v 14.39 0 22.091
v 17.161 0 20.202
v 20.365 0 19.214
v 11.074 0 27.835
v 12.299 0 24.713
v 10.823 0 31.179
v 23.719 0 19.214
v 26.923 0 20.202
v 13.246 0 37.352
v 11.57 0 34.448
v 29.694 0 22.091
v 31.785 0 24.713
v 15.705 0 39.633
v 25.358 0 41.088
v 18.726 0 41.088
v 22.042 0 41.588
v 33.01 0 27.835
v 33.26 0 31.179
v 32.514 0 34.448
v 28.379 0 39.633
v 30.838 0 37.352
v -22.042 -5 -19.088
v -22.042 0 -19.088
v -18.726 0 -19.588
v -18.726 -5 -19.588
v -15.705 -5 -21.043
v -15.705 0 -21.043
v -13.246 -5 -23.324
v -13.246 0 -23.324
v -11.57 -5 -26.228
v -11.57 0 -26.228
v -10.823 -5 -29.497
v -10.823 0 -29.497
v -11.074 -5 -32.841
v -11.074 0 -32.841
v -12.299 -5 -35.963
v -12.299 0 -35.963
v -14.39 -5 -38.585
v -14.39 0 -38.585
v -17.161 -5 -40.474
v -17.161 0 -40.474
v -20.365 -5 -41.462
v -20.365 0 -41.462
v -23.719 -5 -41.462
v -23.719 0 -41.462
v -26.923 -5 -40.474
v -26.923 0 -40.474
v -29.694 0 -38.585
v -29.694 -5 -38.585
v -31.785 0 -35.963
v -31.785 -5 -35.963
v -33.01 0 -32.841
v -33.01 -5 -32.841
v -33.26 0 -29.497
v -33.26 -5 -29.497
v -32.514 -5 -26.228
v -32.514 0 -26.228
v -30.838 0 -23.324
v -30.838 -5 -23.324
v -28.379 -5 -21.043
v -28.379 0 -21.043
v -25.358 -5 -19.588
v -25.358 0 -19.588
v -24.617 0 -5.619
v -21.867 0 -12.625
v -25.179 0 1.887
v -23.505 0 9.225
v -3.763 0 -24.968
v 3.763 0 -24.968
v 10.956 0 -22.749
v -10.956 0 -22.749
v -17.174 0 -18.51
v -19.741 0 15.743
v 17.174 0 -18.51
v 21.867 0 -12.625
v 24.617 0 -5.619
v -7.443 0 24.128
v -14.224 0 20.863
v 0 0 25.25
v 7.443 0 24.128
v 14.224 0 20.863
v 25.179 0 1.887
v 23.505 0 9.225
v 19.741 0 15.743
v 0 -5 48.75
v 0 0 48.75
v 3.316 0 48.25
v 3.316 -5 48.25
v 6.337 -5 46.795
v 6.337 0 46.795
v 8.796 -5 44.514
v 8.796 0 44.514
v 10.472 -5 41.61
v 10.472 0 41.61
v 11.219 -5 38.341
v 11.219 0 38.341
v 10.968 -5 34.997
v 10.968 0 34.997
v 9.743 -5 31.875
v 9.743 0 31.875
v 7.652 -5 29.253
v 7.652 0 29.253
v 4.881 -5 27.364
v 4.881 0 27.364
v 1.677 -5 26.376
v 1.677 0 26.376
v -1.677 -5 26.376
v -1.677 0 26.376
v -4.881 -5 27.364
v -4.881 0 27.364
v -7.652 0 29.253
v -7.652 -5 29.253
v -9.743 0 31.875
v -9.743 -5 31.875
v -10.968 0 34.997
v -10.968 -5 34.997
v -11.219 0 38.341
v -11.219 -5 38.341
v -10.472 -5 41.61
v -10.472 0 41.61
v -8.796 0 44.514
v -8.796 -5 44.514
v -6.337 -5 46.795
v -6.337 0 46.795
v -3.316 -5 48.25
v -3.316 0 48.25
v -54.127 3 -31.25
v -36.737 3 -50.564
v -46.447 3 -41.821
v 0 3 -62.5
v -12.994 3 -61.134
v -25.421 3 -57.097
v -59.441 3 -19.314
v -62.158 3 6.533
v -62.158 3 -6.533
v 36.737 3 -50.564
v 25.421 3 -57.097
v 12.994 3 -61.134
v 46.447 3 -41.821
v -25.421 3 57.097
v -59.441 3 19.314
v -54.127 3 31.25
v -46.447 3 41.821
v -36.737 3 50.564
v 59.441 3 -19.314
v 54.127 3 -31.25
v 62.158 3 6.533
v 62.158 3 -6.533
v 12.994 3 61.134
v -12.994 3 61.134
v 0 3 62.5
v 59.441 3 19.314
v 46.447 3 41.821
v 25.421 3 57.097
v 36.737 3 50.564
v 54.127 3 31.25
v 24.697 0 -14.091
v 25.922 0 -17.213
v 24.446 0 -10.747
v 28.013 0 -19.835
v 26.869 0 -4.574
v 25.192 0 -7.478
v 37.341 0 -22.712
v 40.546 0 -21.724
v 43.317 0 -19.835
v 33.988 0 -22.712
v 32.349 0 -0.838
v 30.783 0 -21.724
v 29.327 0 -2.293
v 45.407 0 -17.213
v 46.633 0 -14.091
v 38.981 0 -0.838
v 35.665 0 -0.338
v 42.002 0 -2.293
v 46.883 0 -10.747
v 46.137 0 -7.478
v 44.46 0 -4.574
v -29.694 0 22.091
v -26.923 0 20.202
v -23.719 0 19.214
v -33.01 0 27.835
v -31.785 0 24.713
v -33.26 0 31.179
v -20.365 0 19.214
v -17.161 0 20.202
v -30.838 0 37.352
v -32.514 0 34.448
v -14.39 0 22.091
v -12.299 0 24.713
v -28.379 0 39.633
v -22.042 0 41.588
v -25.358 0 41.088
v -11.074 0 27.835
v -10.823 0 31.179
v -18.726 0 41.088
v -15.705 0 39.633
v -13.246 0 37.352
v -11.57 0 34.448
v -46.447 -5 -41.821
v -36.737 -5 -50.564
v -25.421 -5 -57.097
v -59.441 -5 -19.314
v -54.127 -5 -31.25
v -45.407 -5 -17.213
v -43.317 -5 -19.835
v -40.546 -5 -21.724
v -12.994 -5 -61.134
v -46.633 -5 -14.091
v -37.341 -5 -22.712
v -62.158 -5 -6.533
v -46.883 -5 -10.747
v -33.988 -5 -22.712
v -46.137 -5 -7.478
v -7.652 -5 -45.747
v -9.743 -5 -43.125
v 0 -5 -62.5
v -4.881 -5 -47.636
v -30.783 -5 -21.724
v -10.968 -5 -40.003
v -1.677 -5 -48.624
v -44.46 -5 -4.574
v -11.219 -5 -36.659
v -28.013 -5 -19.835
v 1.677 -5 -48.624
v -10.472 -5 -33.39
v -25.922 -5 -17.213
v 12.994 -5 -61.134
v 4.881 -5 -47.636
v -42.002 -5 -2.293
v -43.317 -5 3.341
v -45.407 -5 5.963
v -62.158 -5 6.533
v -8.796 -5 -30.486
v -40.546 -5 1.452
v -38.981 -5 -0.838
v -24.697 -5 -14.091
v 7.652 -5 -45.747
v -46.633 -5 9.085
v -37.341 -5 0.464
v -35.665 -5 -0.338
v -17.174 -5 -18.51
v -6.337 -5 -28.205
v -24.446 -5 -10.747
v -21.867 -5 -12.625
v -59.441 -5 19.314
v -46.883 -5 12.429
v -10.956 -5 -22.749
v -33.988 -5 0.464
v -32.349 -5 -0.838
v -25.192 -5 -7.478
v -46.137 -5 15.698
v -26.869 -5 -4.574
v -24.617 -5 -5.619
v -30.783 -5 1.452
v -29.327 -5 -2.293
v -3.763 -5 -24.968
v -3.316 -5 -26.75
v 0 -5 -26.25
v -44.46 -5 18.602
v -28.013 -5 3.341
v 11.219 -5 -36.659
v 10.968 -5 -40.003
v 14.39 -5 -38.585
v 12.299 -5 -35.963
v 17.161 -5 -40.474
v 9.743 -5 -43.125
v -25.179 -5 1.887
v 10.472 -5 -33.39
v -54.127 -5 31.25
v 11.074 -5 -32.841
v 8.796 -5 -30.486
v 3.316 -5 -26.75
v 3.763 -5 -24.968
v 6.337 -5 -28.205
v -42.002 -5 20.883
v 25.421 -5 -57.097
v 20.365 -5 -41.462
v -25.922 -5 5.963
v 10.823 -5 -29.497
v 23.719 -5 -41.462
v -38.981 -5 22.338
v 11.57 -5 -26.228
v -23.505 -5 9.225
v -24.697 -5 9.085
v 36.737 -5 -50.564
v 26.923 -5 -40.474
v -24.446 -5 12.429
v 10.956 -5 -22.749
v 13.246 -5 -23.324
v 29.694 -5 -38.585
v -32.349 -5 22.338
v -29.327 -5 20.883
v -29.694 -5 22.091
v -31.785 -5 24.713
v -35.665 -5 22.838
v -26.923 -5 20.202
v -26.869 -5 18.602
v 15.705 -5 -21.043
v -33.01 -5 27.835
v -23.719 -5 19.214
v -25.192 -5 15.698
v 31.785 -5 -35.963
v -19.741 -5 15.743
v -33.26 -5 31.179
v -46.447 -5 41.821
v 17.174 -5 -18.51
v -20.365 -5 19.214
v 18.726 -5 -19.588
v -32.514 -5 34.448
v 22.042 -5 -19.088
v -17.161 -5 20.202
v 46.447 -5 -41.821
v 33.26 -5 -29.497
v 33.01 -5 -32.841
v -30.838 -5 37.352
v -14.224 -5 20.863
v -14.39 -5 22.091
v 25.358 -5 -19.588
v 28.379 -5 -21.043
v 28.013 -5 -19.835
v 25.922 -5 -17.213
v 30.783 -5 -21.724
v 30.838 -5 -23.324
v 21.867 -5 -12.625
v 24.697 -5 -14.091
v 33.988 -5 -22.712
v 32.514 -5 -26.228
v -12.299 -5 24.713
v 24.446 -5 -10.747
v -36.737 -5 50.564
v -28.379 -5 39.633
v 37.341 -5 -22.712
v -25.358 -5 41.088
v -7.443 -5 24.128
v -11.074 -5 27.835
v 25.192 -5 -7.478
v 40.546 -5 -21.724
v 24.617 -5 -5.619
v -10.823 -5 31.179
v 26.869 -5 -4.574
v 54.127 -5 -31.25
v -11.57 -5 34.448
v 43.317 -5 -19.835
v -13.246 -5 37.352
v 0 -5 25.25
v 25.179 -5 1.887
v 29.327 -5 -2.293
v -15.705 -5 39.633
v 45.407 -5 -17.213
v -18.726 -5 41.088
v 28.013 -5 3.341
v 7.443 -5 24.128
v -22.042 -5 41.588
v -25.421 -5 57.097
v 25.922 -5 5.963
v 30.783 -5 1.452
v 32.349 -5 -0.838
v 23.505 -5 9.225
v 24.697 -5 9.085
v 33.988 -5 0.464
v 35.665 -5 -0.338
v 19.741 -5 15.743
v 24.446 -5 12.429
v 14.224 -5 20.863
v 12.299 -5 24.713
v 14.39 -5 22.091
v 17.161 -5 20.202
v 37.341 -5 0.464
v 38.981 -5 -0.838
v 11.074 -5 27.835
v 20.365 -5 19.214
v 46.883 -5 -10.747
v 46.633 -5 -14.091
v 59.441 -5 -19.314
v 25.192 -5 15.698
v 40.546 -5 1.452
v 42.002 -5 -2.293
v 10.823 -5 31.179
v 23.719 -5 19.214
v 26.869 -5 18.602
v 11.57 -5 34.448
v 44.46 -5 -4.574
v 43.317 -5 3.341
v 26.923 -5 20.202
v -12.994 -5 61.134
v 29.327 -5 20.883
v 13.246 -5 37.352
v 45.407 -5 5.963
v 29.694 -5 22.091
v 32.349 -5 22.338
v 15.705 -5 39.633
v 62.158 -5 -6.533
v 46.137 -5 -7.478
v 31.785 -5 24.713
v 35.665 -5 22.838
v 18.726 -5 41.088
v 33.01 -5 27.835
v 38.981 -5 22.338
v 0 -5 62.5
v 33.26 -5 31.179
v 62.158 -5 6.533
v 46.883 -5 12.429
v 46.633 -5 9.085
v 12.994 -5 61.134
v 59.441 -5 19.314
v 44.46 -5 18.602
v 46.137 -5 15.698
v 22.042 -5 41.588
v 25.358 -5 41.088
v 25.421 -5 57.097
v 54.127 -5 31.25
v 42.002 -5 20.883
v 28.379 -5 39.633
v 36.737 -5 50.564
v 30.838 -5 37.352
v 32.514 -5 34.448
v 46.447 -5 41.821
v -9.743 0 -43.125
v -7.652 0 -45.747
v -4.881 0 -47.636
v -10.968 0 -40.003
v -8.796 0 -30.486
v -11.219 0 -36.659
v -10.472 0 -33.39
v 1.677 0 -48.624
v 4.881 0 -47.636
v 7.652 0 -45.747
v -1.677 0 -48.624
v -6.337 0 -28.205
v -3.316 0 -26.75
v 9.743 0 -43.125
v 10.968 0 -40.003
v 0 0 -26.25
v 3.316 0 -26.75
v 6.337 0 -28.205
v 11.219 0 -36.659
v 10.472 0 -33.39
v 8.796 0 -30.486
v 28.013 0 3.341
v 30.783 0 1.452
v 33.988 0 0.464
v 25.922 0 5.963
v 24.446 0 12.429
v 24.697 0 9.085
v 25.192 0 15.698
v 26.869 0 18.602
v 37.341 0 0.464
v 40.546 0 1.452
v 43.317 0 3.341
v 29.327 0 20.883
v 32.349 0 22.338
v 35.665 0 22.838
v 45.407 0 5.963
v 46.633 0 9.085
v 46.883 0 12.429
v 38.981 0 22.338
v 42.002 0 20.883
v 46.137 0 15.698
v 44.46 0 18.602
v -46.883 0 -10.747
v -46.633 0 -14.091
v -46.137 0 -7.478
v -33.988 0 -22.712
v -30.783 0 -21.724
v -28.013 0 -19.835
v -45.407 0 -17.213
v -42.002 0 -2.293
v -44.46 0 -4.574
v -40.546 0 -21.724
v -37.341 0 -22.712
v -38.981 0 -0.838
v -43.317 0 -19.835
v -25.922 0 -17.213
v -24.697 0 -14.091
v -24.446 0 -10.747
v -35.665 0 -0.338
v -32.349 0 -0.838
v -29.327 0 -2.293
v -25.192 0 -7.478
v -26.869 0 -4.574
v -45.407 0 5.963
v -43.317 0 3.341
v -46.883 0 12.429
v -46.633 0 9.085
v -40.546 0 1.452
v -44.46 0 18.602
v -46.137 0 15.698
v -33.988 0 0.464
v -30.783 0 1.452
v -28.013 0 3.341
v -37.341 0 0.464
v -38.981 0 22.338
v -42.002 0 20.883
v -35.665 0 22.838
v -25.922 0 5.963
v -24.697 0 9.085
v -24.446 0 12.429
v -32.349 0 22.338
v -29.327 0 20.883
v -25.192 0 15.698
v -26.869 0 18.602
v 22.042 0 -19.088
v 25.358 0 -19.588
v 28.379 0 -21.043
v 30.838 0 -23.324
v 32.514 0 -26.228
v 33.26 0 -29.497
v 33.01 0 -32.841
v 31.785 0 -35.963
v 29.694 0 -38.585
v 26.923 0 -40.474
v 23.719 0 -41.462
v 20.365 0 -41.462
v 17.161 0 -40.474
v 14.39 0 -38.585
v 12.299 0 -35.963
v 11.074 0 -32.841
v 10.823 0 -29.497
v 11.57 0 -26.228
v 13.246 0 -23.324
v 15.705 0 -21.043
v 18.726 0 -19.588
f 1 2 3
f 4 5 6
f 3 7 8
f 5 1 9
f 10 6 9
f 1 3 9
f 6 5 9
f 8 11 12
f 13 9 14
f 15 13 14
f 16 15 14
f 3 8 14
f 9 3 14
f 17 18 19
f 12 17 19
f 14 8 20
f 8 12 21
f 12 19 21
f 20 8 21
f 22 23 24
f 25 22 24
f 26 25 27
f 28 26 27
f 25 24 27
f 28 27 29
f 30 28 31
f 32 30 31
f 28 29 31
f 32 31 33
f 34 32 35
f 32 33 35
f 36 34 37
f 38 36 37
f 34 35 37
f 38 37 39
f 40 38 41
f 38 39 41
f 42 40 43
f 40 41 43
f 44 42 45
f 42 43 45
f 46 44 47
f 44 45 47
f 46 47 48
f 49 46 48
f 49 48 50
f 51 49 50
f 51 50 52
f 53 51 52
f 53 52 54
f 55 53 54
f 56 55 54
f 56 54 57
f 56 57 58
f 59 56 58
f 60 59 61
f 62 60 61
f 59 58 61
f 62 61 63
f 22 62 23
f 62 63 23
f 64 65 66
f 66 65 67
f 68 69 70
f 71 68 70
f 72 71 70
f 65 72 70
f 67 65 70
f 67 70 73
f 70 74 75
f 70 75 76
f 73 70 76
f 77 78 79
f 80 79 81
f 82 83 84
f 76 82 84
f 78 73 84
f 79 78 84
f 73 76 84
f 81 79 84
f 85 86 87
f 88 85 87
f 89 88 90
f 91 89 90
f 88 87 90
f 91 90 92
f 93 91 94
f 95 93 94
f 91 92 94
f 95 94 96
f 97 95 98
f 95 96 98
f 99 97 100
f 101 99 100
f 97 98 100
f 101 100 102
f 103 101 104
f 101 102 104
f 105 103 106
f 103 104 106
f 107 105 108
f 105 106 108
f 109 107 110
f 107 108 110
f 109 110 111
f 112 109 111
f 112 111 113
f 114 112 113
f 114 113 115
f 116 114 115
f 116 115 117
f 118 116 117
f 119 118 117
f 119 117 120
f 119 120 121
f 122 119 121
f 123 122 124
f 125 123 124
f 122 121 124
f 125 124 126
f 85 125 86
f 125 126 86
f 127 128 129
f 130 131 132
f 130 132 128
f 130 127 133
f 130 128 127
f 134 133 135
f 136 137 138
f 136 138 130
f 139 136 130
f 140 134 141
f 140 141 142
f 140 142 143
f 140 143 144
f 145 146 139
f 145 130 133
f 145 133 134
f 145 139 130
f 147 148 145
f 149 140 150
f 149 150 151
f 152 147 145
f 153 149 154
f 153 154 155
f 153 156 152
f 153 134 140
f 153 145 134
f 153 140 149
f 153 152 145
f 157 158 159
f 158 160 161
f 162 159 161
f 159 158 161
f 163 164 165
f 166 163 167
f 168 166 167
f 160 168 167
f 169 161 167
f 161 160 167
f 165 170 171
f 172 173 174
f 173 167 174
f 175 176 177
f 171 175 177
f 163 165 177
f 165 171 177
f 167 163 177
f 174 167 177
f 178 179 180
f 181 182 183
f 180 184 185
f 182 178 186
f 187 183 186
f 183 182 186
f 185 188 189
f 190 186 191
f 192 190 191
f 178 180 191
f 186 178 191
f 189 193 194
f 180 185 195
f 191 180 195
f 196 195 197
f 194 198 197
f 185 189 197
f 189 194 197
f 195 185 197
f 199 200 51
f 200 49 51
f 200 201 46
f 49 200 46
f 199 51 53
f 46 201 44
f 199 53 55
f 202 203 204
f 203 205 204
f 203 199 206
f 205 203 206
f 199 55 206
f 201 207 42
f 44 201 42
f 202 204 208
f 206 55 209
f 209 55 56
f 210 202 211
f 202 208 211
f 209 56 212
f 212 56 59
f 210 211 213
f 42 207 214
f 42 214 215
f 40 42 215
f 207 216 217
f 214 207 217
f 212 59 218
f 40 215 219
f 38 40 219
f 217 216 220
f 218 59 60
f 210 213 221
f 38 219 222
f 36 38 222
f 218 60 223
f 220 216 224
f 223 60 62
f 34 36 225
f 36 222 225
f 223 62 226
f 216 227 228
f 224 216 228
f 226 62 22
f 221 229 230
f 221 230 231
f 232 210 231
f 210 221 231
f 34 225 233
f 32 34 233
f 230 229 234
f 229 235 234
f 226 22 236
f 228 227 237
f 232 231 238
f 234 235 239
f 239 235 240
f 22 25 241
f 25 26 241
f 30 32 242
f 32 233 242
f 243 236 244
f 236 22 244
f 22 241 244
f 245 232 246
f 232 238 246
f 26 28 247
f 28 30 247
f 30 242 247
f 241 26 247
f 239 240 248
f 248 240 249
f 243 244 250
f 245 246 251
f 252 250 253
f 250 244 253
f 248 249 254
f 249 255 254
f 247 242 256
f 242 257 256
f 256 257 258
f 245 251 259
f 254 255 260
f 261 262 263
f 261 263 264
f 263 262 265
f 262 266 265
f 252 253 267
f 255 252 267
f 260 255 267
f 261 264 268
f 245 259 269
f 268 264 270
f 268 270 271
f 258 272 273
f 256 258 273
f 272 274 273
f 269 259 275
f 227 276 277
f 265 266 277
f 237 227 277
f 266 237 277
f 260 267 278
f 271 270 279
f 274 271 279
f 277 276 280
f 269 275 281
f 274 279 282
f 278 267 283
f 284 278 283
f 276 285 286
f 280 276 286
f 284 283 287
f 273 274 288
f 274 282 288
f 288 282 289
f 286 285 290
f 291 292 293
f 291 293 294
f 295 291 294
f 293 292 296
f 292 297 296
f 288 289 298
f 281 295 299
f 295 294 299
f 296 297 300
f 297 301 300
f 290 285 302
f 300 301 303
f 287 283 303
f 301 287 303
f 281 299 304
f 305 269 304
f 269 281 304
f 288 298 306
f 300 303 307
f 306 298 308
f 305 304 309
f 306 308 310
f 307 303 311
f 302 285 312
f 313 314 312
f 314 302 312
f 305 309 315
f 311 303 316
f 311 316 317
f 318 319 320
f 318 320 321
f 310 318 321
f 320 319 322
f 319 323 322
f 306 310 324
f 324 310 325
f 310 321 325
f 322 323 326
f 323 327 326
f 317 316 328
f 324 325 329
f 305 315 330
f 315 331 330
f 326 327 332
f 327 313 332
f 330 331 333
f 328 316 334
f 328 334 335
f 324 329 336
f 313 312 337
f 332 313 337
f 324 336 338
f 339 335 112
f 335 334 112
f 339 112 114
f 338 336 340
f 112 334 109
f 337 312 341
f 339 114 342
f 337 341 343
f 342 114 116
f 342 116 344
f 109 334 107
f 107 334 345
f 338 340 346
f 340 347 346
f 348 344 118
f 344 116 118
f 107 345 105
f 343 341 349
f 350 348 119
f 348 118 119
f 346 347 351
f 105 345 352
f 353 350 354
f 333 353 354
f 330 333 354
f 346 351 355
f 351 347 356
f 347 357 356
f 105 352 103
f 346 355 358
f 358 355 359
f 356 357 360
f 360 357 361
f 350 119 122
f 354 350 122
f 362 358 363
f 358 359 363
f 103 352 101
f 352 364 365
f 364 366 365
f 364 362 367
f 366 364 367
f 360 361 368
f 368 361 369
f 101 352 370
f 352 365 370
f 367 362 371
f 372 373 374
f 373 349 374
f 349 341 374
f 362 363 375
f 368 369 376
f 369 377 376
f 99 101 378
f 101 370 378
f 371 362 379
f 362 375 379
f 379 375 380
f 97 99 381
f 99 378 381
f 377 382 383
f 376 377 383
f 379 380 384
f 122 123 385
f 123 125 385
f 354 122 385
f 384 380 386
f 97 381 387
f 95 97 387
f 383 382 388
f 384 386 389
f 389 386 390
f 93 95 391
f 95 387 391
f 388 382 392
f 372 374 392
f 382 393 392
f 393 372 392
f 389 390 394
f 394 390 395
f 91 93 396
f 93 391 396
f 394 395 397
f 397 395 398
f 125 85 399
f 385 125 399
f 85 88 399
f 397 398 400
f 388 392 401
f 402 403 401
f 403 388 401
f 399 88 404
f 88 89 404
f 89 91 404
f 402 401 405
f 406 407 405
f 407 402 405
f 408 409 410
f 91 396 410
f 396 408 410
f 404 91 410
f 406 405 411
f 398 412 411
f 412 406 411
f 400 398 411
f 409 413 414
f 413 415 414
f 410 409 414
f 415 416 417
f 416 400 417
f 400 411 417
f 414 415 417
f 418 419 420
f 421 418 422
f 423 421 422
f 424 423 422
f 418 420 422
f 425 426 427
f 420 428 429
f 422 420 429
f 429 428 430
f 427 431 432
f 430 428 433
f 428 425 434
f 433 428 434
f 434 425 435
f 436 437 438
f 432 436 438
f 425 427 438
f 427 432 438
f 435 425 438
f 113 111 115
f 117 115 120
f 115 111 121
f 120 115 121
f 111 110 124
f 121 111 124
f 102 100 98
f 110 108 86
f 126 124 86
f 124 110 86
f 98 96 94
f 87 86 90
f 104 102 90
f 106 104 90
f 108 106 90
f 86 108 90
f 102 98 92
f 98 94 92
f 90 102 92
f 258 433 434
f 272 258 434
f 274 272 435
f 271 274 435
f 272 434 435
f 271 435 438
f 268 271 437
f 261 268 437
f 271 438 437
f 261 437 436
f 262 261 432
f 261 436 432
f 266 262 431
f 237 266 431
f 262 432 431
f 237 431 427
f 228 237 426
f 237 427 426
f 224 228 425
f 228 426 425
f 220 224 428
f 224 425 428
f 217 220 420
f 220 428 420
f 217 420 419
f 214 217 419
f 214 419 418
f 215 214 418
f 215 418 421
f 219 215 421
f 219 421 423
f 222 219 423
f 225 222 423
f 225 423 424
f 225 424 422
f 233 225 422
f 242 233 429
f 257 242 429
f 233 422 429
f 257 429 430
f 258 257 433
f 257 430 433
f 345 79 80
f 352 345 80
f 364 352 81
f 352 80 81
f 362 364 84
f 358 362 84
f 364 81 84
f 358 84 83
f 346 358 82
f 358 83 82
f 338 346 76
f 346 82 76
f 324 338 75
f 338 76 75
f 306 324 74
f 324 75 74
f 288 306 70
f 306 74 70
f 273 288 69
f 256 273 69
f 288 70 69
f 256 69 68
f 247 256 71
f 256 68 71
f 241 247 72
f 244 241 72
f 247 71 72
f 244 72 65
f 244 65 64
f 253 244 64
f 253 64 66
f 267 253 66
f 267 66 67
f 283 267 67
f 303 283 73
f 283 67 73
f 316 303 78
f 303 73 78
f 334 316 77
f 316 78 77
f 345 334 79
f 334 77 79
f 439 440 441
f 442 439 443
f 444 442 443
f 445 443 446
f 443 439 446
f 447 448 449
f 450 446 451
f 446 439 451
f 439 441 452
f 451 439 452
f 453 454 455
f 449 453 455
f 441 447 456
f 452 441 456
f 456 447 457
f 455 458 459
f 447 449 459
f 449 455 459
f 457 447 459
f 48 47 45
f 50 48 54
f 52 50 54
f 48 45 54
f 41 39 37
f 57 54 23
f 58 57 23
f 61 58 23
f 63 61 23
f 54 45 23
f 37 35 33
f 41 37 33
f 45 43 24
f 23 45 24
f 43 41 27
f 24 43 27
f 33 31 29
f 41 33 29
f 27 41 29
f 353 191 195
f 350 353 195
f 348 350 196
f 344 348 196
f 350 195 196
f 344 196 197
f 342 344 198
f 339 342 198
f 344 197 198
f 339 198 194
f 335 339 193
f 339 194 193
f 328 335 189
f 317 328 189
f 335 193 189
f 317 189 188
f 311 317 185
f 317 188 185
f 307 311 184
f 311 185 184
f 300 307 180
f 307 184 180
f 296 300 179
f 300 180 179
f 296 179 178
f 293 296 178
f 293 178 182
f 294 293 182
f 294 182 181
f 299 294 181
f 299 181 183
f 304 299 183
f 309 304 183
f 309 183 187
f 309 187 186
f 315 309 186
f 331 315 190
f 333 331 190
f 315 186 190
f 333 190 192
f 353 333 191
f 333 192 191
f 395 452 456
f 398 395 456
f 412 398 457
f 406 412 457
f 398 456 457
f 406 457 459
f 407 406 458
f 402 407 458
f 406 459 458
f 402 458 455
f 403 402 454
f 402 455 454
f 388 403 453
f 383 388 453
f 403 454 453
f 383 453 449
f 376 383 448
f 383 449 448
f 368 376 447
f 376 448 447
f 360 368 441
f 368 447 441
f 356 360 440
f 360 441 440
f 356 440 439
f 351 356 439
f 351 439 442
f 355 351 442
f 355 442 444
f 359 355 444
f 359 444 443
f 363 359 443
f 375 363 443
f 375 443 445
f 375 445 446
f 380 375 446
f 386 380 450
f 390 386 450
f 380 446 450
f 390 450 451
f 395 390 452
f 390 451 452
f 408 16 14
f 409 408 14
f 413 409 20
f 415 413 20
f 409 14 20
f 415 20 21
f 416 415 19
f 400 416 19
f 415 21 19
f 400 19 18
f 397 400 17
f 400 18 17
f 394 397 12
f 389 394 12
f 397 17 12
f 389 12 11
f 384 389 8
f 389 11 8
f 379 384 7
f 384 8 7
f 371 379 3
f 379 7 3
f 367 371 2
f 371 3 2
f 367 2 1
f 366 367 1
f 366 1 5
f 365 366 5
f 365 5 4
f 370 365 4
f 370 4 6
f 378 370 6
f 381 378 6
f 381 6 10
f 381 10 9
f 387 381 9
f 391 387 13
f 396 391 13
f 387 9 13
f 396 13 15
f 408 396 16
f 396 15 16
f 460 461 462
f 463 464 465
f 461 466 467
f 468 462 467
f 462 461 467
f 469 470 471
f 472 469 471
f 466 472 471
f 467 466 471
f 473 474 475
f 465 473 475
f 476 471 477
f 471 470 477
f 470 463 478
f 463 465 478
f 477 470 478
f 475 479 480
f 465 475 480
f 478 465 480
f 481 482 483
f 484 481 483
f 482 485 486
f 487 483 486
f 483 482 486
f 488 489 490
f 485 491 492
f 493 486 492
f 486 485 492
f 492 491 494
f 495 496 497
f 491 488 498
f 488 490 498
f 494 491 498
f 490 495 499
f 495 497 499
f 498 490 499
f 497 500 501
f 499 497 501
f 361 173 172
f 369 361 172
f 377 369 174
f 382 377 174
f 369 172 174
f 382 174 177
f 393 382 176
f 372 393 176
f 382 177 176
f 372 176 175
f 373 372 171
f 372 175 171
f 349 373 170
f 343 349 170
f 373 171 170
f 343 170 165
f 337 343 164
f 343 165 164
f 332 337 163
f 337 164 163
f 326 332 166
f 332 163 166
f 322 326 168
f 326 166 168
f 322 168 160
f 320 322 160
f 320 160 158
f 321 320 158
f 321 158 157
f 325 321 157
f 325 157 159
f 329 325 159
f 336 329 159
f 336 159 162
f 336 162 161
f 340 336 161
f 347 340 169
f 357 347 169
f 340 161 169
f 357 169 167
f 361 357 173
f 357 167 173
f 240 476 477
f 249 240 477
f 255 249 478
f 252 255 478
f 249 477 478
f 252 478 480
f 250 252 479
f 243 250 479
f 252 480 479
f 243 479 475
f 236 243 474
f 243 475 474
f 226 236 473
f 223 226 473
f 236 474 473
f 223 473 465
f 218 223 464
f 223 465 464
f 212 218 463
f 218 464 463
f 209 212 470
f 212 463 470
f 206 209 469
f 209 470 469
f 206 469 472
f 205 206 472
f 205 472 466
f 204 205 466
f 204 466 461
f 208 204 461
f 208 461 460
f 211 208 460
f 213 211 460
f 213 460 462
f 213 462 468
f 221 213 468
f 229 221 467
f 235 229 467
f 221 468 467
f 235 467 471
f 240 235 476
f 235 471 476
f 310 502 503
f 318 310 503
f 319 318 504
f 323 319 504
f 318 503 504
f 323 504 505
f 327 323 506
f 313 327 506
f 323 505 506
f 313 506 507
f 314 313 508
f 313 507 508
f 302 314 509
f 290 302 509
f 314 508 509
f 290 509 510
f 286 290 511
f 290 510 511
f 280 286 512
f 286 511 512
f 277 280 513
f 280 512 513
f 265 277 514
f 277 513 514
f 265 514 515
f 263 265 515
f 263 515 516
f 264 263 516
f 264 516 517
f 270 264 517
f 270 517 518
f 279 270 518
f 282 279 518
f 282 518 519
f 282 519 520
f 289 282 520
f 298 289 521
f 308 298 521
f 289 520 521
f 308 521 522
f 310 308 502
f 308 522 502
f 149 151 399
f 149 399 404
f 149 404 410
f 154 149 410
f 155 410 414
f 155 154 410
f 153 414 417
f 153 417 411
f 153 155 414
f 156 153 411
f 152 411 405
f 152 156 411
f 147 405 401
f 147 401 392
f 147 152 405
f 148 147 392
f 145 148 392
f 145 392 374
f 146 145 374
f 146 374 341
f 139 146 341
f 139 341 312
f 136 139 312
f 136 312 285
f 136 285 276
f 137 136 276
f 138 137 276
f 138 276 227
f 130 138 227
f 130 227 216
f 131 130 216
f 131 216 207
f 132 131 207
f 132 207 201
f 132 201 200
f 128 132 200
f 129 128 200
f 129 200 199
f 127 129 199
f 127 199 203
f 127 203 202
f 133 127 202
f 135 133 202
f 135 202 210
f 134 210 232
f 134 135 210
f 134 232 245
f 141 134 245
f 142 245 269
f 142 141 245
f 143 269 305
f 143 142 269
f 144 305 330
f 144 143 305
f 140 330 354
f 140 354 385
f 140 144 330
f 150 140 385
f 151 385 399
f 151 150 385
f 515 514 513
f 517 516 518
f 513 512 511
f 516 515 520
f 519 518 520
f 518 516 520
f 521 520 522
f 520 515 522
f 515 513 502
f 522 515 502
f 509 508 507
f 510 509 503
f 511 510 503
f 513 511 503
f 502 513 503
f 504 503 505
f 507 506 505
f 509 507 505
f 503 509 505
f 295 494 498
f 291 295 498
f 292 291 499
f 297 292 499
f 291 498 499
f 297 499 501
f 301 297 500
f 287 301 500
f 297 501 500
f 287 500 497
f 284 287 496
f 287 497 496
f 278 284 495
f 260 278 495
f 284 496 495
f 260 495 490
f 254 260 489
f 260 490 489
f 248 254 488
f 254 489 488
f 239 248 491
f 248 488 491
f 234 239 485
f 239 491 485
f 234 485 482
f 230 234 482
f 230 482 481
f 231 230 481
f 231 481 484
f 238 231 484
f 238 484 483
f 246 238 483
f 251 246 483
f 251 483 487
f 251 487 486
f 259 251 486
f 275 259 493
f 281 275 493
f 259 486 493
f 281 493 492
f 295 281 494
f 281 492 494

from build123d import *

# Parameters (mm, degrees)
SKETCH2_R           = 62.5
SKETCH2_R_2         = 11.25
SKETCH2_R_3         = 25.25
BOSS_EXTRUDE1_DEPTH = 5
BOSS_EXTRUDE2_START = 3
SKETCH1_R           = 62.5
BOSS_EXTRUDE2_DEPTH = 3


with BuildPart() as part:
    # Sketch2 → Boss-Extrude1 (new body)
    with BuildSketch(Plane(origin=(0, 0, 0), x_dir=(1, 0, 0), z_dir=(0, 1, 0))):
        with Locations(Location((0, 0, 0), (0, 0, 270))):
            Circle(SKETCH2_R)
        with Locations(Location((0, 37.5, 0), (0, 0, 270))):
            Circle(SKETCH2_R_2, mode=Mode.SUBTRACT)
        with Locations(Location((22.041946961, 30.338137289, 0), (0, 0, 270))):
            Circle(SKETCH2_R_2, mode=Mode.SUBTRACT)
        with Locations(Location((35.664619361, 11.588137289, 0), (0, 0, 270))):
            Circle(SKETCH2_R_2, mode=Mode.SUBTRACT)
        with Locations(Location((35.664619361, -11.588137289, 0), (0, 0, 270))):
            Circle(SKETCH2_R_2, mode=Mode.SUBTRACT)
        with Locations(Location((22.041946961, -30.338137289, 0), (0, 0, 270))):
            Circle(SKETCH2_R_2, mode=Mode.SUBTRACT)
        with Locations(Location((0, -37.5, 0), (0, 0, 270))):
            Circle(SKETCH2_R_2, mode=Mode.SUBTRACT)
        with Locations(Location((-22.041946961, -30.338137289, 0), (0, 0, 270))):
            Circle(SKETCH2_R_2, mode=Mode.SUBTRACT)
        with Locations(Location((-35.664619361, -11.588137289, 0), (0, 0, 270))):
            Circle(SKETCH2_R_2, mode=Mode.SUBTRACT)
        with Locations(Location((-35.664619361, 11.588137289, 0), (0, 0, 270))):
            Circle(SKETCH2_R_2, mode=Mode.SUBTRACT)
        with Locations(Location((-22.041946961, 30.338137289, 0), (0, 0, 270))):
            Circle(SKETCH2_R_2, mode=Mode.SUBTRACT)
        with Locations(Location((0, 0, 0), (0, 0, 270))):
            Circle(SKETCH2_R_3, mode=Mode.SUBTRACT)
    extrude(amount=-BOSS_EXTRUDE1_DEPTH)

    # Sketch1 → Boss-Extrude2 (add)
    with BuildSketch(Plane(origin=(0, 0, 0), x_dir=(1, 0, 0), z_dir=(0, 1, 0)).offset(BOSS_EXTRUDE2_START)):
        with Locations(Location((0, 0, 0), (0, 0, 270))):
            Circle(SKETCH1_R)
    extrude(amount=-BOSS_EXTRUDE2_DEPTH)


solid = part.part
